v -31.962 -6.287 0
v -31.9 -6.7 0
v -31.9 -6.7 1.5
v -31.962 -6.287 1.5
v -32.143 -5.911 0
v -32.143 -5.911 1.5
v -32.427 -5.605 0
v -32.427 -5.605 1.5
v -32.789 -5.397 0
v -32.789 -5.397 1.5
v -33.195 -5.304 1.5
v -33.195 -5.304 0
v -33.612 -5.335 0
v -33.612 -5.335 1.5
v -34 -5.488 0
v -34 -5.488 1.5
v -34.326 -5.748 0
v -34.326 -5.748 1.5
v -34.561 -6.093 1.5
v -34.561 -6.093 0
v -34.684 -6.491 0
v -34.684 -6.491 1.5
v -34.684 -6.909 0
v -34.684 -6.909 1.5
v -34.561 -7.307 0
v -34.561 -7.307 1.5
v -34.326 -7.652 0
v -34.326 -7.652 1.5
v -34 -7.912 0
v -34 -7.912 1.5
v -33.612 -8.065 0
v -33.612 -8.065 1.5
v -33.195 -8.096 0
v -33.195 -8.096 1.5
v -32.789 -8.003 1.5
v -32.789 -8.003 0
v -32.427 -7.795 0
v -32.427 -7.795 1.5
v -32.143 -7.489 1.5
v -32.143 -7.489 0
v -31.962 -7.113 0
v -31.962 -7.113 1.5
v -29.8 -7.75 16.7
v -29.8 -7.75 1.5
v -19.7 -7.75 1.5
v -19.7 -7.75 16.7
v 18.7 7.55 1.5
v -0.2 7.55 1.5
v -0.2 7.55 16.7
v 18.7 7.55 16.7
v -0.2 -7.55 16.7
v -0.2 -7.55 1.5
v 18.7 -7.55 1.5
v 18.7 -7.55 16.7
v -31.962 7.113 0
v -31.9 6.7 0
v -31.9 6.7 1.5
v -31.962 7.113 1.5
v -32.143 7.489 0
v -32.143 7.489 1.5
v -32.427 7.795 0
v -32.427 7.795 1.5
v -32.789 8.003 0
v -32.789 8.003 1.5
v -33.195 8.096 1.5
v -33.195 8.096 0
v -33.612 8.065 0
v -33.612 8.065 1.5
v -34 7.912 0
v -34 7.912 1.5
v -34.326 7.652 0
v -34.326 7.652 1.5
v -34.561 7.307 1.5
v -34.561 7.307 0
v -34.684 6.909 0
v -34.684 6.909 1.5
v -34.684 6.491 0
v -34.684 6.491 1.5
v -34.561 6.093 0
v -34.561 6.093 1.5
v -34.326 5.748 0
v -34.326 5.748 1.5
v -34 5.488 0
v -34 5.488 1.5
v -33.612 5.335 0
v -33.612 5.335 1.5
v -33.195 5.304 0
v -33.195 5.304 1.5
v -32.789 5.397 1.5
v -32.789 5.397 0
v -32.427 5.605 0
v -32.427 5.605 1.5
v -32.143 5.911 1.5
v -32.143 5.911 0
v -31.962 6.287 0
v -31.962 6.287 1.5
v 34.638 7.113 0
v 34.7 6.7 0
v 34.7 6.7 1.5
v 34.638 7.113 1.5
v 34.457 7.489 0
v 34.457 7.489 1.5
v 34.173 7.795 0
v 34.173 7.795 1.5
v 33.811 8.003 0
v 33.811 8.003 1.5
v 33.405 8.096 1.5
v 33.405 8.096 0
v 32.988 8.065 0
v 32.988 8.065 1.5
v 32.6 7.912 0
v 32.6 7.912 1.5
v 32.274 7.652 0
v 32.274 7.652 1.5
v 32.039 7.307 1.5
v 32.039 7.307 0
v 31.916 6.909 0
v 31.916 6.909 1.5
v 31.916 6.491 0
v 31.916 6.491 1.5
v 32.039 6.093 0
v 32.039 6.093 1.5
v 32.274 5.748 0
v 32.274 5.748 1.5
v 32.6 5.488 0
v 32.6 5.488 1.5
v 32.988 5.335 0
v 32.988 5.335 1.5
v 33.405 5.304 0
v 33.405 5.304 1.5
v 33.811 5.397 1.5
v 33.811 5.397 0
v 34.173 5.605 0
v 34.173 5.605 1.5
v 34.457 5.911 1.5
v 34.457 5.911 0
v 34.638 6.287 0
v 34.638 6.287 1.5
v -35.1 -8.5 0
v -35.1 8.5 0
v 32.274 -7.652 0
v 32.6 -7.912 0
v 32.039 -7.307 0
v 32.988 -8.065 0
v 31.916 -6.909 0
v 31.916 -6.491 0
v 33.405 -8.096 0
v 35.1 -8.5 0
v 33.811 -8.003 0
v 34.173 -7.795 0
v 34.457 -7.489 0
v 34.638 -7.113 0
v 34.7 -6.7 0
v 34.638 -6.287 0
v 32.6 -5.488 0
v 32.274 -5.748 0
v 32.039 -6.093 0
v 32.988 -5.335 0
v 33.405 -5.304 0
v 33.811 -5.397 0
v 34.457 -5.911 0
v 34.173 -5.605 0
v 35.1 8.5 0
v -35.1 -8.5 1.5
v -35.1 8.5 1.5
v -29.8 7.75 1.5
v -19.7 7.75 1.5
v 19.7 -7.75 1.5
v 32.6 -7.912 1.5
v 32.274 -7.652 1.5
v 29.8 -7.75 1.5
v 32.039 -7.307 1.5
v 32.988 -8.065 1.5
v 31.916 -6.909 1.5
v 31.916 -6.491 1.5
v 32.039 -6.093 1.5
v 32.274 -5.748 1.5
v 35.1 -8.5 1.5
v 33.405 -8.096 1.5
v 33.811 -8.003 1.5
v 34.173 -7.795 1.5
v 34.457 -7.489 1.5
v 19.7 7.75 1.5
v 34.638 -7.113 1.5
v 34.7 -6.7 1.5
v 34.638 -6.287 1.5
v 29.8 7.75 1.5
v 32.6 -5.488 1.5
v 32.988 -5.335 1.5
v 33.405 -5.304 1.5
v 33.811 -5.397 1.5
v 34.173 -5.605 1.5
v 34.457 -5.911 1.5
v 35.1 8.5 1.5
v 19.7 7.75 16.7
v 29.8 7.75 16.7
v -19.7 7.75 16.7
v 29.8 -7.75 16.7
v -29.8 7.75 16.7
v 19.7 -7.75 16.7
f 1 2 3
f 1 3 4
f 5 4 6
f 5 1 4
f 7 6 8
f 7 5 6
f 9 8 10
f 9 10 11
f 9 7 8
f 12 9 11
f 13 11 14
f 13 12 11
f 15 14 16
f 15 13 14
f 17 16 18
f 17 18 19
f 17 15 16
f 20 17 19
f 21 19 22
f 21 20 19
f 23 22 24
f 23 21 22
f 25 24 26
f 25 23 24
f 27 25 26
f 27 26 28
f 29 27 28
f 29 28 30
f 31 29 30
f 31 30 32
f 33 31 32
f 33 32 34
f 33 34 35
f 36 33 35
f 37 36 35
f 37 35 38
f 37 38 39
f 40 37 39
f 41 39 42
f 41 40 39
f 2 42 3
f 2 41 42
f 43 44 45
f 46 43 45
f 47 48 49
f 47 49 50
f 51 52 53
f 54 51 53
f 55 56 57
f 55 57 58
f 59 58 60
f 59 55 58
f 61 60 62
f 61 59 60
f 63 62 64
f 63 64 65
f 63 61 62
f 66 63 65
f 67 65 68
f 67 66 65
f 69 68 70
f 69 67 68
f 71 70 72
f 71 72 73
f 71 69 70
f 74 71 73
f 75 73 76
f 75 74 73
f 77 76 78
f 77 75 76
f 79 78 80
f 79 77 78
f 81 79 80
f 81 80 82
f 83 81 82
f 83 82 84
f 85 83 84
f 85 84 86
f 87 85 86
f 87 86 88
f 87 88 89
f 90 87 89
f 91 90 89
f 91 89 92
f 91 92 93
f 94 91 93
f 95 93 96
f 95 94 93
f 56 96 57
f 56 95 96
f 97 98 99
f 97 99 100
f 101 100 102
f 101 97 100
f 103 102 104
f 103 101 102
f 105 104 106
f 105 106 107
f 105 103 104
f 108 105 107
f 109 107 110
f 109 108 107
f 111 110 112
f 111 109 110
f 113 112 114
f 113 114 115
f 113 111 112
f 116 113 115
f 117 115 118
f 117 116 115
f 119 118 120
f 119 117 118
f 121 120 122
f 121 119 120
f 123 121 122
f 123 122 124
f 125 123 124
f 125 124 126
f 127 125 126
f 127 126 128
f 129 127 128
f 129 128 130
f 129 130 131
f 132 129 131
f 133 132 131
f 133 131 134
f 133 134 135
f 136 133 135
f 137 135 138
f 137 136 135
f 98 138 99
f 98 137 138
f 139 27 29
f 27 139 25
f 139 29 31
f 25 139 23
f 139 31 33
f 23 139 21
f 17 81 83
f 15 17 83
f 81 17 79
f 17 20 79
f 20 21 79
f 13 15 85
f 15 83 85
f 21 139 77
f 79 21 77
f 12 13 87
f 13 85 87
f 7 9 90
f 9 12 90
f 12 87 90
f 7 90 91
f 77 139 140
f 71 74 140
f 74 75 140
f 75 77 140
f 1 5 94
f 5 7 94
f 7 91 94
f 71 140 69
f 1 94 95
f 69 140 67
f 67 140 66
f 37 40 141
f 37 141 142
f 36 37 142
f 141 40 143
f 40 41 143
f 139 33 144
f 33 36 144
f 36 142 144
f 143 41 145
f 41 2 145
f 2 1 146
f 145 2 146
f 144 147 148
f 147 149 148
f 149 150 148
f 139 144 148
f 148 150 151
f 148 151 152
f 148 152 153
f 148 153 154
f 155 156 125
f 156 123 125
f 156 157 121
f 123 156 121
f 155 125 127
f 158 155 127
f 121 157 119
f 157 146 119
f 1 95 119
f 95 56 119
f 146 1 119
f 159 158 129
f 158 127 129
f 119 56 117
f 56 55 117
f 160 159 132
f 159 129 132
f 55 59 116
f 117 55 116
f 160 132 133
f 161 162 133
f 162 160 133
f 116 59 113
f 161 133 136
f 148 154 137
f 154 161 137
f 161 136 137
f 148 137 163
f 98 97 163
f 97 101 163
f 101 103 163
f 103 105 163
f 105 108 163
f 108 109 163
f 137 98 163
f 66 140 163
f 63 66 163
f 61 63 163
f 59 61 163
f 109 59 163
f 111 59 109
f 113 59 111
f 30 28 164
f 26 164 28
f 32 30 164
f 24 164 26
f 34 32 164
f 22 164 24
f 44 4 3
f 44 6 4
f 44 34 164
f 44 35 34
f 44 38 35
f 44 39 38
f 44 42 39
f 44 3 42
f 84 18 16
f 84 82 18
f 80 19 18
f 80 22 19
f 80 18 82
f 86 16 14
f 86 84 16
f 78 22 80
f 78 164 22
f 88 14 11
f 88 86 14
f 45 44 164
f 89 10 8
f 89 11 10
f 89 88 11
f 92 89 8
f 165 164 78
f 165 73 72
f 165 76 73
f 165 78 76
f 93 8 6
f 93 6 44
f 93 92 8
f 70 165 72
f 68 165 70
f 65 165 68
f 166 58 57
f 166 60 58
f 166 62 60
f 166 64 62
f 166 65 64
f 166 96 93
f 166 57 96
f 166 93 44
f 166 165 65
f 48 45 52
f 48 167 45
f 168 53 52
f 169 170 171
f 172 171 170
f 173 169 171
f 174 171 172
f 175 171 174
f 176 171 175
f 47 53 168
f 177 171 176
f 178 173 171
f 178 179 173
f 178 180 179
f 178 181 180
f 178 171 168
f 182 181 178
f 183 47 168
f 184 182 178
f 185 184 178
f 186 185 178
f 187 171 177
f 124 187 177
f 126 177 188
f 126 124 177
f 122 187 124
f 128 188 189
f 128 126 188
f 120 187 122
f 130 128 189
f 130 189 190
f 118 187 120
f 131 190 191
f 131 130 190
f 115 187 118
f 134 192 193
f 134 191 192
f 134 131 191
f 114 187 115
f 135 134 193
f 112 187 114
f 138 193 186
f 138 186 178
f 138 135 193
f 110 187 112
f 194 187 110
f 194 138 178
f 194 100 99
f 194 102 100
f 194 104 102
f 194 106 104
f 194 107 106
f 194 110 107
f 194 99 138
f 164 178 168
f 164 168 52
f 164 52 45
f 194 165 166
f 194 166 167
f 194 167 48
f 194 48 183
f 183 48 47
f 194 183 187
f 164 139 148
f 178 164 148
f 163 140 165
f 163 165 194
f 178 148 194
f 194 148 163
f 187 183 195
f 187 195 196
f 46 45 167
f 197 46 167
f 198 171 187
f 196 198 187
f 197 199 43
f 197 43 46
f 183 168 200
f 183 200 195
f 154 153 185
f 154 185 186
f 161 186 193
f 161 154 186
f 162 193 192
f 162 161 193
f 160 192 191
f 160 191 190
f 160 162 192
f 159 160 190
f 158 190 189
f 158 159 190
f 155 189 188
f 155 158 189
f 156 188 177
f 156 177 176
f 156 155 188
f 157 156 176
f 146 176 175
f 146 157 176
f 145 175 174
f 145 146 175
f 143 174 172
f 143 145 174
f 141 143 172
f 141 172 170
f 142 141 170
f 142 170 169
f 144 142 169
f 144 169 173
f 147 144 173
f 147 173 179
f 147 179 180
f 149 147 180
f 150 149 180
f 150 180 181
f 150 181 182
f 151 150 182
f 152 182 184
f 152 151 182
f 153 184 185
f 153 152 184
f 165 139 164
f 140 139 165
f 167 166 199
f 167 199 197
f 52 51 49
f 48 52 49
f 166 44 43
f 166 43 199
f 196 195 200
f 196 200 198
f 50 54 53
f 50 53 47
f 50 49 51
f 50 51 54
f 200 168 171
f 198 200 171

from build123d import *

# Parameters (mm, degrees)
SKETCH_W      = 70.2
SKETCH_H      = 17
SKETCH_R      = 1.4
PAD_DEPTH     = 1.5
SKETCH001_W   = 10.1
SKETCH001_H   = 15.5
SKETCH001_W_2 = 18.9
SKETCH001_H_2 = 15.1
PAD001_DEPTH  = 15.2


with BuildPart() as part:
    # Sketch → Pad (new body)
    with BuildSketch(Plane.XY):
        Rectangle(SKETCH_W, SKETCH_H)
        with Locations((-33.3, 6.7)):
            Circle(SKETCH_R, mode=Mode.SUBTRACT)
        with Locations((33.3, 6.7)):
            Circle(SKETCH_R, mode=Mode.SUBTRACT)
        with Locations((-33.3, -6.7)):
            Circle(SKETCH_R, mode=Mode.SUBTRACT)
        with Locations((33.3, -6.7)):
            Circle(SKETCH_R, mode=Mode.SUBTRACT)
    extrude(amount=PAD_DEPTH)

    # Sketch001 (on Face10 of Pad) → Pad001 (join)
    with BuildSketch(Plane.XY.offset(1.5)):
        with Locations((-24.75, 0)):
            Rectangle(SKETCH001_W, SKETCH001_H)
        with Locations((24.75, 0)):
            Rectangle(SKETCH001_W, SKETCH001_H)
        with Locations((9.25, 0)):
            Rectangle(SKETCH001_W_2, SKETCH001_H_2)
    extrude(amount=PAD001_DEPTH)


solid = part.part
